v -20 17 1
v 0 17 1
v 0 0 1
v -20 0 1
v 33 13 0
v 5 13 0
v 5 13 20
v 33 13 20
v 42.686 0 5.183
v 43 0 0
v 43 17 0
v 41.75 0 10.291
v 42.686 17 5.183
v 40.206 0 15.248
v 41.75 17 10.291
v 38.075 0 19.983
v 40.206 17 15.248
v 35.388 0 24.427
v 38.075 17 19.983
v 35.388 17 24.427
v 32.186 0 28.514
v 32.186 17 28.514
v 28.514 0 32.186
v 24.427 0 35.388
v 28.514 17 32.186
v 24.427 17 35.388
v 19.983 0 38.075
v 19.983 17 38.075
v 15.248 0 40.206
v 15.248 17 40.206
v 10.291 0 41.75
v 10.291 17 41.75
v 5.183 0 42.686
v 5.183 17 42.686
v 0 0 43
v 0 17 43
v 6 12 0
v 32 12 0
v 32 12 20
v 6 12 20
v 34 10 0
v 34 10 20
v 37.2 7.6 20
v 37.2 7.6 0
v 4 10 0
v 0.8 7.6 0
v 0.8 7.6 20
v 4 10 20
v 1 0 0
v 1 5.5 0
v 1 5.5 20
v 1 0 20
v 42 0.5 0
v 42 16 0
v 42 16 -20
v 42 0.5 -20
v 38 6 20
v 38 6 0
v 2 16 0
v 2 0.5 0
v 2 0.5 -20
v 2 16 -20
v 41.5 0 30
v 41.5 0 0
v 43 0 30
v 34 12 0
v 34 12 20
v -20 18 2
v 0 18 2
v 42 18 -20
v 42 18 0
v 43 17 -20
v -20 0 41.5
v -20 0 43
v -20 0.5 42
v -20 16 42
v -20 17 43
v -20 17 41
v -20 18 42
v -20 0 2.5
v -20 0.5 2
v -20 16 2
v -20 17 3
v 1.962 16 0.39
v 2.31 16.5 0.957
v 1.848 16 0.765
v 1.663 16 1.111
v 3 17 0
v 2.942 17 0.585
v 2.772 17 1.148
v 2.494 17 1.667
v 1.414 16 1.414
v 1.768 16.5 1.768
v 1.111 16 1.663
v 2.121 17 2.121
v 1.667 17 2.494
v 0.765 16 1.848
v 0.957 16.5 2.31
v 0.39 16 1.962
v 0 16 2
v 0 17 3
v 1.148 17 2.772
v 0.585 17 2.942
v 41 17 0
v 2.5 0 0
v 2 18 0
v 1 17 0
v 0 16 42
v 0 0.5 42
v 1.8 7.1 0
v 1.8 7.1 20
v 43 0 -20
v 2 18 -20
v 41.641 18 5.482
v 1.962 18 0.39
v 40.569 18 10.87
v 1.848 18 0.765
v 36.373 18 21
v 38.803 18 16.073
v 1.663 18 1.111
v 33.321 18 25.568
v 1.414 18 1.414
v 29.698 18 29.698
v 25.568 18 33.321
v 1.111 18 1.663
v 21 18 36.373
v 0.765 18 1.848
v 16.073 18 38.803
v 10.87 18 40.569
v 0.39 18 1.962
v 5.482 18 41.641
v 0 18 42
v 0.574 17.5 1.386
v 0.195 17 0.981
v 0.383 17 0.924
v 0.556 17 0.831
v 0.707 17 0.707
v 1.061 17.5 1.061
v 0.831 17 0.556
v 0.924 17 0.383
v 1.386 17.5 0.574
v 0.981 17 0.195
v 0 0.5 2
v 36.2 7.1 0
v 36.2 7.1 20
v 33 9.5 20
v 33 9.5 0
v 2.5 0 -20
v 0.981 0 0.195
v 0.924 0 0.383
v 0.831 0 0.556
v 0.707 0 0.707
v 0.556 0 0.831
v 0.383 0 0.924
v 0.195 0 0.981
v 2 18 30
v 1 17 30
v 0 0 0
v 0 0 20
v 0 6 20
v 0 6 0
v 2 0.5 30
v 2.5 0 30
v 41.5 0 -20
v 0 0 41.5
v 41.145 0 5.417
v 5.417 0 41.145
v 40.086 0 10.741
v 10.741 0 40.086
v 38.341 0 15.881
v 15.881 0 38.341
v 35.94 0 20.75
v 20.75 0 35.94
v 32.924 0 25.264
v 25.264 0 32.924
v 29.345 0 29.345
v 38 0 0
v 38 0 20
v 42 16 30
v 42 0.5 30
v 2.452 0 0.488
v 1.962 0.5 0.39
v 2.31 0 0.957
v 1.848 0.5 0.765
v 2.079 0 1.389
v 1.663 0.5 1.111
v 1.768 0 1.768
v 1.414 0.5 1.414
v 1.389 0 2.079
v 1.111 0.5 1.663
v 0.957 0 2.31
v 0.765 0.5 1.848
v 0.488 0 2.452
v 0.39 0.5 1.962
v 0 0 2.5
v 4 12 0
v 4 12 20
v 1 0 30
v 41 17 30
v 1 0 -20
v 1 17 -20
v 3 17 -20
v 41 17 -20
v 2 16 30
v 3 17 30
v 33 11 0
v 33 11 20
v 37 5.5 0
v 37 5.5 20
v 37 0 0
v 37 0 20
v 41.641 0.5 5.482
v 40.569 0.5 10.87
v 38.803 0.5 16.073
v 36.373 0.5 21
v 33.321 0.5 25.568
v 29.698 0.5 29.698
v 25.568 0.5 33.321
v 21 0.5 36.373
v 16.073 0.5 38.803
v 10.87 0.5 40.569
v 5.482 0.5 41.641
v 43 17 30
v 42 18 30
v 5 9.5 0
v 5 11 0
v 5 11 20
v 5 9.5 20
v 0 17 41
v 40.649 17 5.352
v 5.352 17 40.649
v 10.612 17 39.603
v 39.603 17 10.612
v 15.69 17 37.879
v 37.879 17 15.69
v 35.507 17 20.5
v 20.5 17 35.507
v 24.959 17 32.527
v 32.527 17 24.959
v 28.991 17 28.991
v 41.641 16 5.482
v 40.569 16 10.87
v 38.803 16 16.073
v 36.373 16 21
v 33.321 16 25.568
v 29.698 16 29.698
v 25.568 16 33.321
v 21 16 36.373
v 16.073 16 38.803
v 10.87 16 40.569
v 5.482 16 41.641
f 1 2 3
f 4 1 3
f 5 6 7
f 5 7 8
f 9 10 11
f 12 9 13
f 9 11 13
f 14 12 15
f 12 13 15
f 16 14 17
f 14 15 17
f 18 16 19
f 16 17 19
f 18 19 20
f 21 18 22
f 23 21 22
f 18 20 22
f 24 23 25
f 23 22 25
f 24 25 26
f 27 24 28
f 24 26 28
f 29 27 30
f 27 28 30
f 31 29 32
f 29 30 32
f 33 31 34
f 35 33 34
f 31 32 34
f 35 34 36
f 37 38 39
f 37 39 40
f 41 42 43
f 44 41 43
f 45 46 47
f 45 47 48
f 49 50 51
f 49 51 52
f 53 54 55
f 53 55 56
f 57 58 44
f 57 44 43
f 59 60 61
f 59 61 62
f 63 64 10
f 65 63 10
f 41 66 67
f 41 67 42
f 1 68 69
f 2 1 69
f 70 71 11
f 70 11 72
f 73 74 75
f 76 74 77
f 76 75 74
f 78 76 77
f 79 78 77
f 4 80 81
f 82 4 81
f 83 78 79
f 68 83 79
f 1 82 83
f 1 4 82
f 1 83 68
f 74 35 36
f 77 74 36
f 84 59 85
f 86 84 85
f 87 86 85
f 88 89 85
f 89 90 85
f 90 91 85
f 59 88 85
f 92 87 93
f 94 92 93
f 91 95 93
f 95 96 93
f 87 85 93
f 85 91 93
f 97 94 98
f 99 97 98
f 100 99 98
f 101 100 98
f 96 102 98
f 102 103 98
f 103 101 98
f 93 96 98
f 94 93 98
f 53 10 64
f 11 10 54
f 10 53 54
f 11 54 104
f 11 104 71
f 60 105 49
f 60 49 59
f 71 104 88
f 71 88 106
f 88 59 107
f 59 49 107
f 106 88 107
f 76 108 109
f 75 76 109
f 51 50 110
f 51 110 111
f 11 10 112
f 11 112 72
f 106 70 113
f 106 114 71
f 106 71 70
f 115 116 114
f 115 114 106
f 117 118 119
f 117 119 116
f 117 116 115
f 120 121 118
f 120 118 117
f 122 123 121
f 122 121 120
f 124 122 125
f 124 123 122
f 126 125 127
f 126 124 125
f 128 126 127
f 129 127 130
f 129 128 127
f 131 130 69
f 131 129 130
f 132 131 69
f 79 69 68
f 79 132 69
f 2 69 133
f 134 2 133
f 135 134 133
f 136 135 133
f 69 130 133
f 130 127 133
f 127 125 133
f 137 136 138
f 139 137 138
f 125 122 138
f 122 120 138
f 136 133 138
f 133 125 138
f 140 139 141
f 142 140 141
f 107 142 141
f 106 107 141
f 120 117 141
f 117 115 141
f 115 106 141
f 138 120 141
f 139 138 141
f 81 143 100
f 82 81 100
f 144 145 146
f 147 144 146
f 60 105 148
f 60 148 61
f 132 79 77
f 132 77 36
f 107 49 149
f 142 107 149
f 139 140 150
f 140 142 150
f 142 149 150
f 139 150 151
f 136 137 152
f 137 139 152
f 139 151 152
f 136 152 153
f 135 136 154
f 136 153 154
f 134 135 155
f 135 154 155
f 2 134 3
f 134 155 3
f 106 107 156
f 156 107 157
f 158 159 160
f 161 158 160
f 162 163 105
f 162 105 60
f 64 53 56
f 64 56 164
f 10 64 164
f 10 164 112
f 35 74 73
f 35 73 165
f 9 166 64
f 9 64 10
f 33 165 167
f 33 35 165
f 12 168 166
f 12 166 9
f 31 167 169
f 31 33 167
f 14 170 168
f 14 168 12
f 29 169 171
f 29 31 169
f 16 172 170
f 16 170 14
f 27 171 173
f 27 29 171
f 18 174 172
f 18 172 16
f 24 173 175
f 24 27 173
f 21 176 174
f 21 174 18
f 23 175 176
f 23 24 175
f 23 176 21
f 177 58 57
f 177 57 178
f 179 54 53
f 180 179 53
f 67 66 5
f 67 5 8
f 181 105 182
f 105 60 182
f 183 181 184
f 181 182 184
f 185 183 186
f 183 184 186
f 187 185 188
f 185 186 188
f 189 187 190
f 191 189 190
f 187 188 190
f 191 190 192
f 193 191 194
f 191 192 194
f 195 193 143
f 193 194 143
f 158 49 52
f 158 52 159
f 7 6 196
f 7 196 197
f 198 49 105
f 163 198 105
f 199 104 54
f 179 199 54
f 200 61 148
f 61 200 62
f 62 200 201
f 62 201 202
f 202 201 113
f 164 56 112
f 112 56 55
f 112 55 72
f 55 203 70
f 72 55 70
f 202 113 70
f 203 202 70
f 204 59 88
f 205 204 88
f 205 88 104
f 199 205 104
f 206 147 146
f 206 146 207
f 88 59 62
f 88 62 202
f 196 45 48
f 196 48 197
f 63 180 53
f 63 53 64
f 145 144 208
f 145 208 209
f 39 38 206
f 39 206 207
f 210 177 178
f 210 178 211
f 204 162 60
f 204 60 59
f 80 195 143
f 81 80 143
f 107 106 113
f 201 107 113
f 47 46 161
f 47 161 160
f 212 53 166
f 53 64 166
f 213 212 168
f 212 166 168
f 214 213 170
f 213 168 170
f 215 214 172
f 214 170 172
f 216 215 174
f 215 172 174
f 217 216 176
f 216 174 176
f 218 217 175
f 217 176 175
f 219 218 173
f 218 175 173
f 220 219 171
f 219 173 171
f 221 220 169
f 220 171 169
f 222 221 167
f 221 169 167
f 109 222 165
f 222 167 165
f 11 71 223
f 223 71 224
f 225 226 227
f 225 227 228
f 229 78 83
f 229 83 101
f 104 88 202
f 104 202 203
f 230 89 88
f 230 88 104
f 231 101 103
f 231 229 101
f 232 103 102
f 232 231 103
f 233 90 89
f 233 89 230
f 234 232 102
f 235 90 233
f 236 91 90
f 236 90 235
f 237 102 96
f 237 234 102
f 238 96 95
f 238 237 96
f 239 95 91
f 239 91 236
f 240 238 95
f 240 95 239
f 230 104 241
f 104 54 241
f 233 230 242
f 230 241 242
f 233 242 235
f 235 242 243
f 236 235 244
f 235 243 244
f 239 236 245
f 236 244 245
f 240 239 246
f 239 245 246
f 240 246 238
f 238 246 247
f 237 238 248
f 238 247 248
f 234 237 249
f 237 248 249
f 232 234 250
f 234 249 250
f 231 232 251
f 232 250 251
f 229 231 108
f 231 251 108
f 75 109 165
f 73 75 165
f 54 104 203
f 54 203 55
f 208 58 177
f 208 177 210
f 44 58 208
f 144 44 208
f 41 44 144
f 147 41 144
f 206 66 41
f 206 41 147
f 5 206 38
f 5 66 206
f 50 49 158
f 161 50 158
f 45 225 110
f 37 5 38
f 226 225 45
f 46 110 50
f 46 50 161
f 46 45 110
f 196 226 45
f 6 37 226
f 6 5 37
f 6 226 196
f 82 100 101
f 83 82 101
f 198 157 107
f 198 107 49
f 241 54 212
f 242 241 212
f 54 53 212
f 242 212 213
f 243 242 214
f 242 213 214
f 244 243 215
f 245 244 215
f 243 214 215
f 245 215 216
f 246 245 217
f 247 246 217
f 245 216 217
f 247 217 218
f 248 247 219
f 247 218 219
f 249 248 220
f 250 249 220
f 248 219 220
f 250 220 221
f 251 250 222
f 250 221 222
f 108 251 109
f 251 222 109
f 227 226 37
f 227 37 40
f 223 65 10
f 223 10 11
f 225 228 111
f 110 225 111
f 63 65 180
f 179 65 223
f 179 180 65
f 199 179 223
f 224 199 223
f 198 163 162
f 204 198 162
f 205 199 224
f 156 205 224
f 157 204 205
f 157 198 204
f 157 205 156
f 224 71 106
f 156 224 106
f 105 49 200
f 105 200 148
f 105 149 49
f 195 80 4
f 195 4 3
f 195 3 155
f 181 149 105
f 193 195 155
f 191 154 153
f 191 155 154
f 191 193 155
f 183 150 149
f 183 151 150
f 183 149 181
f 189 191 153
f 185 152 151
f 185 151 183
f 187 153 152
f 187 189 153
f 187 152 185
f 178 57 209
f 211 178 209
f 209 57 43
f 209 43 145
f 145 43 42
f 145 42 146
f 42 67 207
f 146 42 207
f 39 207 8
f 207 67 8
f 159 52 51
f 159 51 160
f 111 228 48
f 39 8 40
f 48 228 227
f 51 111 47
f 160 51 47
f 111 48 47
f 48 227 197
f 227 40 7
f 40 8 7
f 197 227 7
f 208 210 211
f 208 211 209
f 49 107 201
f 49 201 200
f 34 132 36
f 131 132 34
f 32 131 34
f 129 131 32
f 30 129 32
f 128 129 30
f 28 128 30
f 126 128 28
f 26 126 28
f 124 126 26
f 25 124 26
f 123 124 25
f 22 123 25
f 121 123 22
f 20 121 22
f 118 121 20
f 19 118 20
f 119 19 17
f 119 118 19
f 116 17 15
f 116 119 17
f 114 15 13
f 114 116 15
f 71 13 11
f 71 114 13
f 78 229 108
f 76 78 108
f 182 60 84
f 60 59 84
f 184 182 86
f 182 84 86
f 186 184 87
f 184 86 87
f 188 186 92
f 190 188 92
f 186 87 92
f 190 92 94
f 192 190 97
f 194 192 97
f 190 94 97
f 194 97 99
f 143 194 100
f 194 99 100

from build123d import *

# Parameters (mm, degrees)
PAD_DEPTH        = 20
CHAMFER_SIZE     = 1
REVOLUTION_ANGLE = -90
PAD001_DEPTH     = 20
PAD002_DEPTH     = 20
CHAMFER001_SIZE  = 1
PAD003_DEPTH     = 30
CHAMFER002_SIZE  = 1


with BuildPart() as clampbody:
    # Sketch → Pad (new body)
    with BuildSketch(Plane.XY):
        Polygon((0, 0), (0, 7), (4, 10), (4, 13), (34, 13), (34, 10), (38, 7), (38, 0), (37, 0), (37, 6.5), (33, 9.5), (33, 12), (5, 12), (5, 9.5), (1, 6.5), (1, 0), align=None)
    extrude(amount=PAD_DEPTH)

    # Chamfer
    chamfer_edges = [clampbody.edges().sort_by_distance(p)[0] for p in [
        (4, 13, 10),
        (0, 7, 10),
        (34, 13, 10),
        (38, 7, 10),
        (1, 6.5, 10),
        (5, 12, 10),
        (33, 12, 10),
        (37, 6.5, 10),
    ]]
    chamfer(chamfer_edges, length=CHAMFER_SIZE)


with BuildPart() as sidecornerbody:
    # Sketch001 → Revolution (revolve)
    with BuildSketch(Plane.XY):
        Polygon((2.5, 0), (2, 0.5), (2, 16), (3, 17), (41, 17), (42, 16), (42, 0.5), (41.5, 0), (43, 0), (43, 18), (1, 18), (1, 0), align=None)
    revolve(axis=Axis((0, 0, 0), (0, 1, 0)), revolution_arc=REVOLUTION_ANGLE)

    # Binder → Pad001 (new body)
    with BuildSketch(Plane(origin=(0, 13.471953, 22), x_dir=(0, 1, 0), z_dir=(-1, 0, 0))):
        Polygon((3.528047, 19), (3.528047, -19), (2.528047, -20), (-12.971953, -20), (-13.471953, -19.5), (-13.471953, -21), (4.528047, -21), (4.528047, 21), (-13.471953, 21), (-13.471953, 19.5), (-12.971953, 20), (2.528047, 20), align=None)
    extrude(amount=PAD001_DEPTH)

    # Sketch001 → Pad002 (join)
    with BuildSketch(Plane.XY):
        Polygon((2.5, 0), (2, 0.5), (2, 16), (3, 17), (41, 17), (42, 16), (42, 0.5), (41.5, 0), (43, 0), (43, 18), (1, 18), (1, 0), align=None)
    extrude(amount=-PAD002_DEPTH)

    # Chamfer001
    chamfer001_edges = [sidecornerbody.edges().sort_by_distance(p)[0] for p in [
        (43, 18, -10),
        (1, 18, -10),
    ]]
    chamfer(chamfer001_edges, length=CHAMFER001_SIZE)


with BuildPart() as connectorbody:
    # Binder001 → Pad003 (new body)
    with BuildSketch(Plane(origin=(22, 13.471953, 0), x_dir=(0, 1, 0), z_dir=(0, 0, 1))):
        Polygon((3.528047, 19), (3.528047, -19), (2.528047, -20), (-12.971953, -20), (-13.471953, -19.5), (-13.471953, -21), (4.528047, -21), (4.528047, 21), (-13.471953, 21), (-13.471953, 19.5), (-12.971953, 20), (2.528047, 20), align=None)
    extrude(amount=PAD003_DEPTH)

    # Chamfer002
    chamfer002_edges = [connectorbody.edges().sort_by_distance(p)[0] for p in [
        (1, 18, 15),
        (43, 18, 15),
    ]]
    chamfer(chamfer002_edges, length=CHAMFER002_SIZE)


solid = Compound([clampbody.part, sidecornerbody.part, connectorbody.part])
